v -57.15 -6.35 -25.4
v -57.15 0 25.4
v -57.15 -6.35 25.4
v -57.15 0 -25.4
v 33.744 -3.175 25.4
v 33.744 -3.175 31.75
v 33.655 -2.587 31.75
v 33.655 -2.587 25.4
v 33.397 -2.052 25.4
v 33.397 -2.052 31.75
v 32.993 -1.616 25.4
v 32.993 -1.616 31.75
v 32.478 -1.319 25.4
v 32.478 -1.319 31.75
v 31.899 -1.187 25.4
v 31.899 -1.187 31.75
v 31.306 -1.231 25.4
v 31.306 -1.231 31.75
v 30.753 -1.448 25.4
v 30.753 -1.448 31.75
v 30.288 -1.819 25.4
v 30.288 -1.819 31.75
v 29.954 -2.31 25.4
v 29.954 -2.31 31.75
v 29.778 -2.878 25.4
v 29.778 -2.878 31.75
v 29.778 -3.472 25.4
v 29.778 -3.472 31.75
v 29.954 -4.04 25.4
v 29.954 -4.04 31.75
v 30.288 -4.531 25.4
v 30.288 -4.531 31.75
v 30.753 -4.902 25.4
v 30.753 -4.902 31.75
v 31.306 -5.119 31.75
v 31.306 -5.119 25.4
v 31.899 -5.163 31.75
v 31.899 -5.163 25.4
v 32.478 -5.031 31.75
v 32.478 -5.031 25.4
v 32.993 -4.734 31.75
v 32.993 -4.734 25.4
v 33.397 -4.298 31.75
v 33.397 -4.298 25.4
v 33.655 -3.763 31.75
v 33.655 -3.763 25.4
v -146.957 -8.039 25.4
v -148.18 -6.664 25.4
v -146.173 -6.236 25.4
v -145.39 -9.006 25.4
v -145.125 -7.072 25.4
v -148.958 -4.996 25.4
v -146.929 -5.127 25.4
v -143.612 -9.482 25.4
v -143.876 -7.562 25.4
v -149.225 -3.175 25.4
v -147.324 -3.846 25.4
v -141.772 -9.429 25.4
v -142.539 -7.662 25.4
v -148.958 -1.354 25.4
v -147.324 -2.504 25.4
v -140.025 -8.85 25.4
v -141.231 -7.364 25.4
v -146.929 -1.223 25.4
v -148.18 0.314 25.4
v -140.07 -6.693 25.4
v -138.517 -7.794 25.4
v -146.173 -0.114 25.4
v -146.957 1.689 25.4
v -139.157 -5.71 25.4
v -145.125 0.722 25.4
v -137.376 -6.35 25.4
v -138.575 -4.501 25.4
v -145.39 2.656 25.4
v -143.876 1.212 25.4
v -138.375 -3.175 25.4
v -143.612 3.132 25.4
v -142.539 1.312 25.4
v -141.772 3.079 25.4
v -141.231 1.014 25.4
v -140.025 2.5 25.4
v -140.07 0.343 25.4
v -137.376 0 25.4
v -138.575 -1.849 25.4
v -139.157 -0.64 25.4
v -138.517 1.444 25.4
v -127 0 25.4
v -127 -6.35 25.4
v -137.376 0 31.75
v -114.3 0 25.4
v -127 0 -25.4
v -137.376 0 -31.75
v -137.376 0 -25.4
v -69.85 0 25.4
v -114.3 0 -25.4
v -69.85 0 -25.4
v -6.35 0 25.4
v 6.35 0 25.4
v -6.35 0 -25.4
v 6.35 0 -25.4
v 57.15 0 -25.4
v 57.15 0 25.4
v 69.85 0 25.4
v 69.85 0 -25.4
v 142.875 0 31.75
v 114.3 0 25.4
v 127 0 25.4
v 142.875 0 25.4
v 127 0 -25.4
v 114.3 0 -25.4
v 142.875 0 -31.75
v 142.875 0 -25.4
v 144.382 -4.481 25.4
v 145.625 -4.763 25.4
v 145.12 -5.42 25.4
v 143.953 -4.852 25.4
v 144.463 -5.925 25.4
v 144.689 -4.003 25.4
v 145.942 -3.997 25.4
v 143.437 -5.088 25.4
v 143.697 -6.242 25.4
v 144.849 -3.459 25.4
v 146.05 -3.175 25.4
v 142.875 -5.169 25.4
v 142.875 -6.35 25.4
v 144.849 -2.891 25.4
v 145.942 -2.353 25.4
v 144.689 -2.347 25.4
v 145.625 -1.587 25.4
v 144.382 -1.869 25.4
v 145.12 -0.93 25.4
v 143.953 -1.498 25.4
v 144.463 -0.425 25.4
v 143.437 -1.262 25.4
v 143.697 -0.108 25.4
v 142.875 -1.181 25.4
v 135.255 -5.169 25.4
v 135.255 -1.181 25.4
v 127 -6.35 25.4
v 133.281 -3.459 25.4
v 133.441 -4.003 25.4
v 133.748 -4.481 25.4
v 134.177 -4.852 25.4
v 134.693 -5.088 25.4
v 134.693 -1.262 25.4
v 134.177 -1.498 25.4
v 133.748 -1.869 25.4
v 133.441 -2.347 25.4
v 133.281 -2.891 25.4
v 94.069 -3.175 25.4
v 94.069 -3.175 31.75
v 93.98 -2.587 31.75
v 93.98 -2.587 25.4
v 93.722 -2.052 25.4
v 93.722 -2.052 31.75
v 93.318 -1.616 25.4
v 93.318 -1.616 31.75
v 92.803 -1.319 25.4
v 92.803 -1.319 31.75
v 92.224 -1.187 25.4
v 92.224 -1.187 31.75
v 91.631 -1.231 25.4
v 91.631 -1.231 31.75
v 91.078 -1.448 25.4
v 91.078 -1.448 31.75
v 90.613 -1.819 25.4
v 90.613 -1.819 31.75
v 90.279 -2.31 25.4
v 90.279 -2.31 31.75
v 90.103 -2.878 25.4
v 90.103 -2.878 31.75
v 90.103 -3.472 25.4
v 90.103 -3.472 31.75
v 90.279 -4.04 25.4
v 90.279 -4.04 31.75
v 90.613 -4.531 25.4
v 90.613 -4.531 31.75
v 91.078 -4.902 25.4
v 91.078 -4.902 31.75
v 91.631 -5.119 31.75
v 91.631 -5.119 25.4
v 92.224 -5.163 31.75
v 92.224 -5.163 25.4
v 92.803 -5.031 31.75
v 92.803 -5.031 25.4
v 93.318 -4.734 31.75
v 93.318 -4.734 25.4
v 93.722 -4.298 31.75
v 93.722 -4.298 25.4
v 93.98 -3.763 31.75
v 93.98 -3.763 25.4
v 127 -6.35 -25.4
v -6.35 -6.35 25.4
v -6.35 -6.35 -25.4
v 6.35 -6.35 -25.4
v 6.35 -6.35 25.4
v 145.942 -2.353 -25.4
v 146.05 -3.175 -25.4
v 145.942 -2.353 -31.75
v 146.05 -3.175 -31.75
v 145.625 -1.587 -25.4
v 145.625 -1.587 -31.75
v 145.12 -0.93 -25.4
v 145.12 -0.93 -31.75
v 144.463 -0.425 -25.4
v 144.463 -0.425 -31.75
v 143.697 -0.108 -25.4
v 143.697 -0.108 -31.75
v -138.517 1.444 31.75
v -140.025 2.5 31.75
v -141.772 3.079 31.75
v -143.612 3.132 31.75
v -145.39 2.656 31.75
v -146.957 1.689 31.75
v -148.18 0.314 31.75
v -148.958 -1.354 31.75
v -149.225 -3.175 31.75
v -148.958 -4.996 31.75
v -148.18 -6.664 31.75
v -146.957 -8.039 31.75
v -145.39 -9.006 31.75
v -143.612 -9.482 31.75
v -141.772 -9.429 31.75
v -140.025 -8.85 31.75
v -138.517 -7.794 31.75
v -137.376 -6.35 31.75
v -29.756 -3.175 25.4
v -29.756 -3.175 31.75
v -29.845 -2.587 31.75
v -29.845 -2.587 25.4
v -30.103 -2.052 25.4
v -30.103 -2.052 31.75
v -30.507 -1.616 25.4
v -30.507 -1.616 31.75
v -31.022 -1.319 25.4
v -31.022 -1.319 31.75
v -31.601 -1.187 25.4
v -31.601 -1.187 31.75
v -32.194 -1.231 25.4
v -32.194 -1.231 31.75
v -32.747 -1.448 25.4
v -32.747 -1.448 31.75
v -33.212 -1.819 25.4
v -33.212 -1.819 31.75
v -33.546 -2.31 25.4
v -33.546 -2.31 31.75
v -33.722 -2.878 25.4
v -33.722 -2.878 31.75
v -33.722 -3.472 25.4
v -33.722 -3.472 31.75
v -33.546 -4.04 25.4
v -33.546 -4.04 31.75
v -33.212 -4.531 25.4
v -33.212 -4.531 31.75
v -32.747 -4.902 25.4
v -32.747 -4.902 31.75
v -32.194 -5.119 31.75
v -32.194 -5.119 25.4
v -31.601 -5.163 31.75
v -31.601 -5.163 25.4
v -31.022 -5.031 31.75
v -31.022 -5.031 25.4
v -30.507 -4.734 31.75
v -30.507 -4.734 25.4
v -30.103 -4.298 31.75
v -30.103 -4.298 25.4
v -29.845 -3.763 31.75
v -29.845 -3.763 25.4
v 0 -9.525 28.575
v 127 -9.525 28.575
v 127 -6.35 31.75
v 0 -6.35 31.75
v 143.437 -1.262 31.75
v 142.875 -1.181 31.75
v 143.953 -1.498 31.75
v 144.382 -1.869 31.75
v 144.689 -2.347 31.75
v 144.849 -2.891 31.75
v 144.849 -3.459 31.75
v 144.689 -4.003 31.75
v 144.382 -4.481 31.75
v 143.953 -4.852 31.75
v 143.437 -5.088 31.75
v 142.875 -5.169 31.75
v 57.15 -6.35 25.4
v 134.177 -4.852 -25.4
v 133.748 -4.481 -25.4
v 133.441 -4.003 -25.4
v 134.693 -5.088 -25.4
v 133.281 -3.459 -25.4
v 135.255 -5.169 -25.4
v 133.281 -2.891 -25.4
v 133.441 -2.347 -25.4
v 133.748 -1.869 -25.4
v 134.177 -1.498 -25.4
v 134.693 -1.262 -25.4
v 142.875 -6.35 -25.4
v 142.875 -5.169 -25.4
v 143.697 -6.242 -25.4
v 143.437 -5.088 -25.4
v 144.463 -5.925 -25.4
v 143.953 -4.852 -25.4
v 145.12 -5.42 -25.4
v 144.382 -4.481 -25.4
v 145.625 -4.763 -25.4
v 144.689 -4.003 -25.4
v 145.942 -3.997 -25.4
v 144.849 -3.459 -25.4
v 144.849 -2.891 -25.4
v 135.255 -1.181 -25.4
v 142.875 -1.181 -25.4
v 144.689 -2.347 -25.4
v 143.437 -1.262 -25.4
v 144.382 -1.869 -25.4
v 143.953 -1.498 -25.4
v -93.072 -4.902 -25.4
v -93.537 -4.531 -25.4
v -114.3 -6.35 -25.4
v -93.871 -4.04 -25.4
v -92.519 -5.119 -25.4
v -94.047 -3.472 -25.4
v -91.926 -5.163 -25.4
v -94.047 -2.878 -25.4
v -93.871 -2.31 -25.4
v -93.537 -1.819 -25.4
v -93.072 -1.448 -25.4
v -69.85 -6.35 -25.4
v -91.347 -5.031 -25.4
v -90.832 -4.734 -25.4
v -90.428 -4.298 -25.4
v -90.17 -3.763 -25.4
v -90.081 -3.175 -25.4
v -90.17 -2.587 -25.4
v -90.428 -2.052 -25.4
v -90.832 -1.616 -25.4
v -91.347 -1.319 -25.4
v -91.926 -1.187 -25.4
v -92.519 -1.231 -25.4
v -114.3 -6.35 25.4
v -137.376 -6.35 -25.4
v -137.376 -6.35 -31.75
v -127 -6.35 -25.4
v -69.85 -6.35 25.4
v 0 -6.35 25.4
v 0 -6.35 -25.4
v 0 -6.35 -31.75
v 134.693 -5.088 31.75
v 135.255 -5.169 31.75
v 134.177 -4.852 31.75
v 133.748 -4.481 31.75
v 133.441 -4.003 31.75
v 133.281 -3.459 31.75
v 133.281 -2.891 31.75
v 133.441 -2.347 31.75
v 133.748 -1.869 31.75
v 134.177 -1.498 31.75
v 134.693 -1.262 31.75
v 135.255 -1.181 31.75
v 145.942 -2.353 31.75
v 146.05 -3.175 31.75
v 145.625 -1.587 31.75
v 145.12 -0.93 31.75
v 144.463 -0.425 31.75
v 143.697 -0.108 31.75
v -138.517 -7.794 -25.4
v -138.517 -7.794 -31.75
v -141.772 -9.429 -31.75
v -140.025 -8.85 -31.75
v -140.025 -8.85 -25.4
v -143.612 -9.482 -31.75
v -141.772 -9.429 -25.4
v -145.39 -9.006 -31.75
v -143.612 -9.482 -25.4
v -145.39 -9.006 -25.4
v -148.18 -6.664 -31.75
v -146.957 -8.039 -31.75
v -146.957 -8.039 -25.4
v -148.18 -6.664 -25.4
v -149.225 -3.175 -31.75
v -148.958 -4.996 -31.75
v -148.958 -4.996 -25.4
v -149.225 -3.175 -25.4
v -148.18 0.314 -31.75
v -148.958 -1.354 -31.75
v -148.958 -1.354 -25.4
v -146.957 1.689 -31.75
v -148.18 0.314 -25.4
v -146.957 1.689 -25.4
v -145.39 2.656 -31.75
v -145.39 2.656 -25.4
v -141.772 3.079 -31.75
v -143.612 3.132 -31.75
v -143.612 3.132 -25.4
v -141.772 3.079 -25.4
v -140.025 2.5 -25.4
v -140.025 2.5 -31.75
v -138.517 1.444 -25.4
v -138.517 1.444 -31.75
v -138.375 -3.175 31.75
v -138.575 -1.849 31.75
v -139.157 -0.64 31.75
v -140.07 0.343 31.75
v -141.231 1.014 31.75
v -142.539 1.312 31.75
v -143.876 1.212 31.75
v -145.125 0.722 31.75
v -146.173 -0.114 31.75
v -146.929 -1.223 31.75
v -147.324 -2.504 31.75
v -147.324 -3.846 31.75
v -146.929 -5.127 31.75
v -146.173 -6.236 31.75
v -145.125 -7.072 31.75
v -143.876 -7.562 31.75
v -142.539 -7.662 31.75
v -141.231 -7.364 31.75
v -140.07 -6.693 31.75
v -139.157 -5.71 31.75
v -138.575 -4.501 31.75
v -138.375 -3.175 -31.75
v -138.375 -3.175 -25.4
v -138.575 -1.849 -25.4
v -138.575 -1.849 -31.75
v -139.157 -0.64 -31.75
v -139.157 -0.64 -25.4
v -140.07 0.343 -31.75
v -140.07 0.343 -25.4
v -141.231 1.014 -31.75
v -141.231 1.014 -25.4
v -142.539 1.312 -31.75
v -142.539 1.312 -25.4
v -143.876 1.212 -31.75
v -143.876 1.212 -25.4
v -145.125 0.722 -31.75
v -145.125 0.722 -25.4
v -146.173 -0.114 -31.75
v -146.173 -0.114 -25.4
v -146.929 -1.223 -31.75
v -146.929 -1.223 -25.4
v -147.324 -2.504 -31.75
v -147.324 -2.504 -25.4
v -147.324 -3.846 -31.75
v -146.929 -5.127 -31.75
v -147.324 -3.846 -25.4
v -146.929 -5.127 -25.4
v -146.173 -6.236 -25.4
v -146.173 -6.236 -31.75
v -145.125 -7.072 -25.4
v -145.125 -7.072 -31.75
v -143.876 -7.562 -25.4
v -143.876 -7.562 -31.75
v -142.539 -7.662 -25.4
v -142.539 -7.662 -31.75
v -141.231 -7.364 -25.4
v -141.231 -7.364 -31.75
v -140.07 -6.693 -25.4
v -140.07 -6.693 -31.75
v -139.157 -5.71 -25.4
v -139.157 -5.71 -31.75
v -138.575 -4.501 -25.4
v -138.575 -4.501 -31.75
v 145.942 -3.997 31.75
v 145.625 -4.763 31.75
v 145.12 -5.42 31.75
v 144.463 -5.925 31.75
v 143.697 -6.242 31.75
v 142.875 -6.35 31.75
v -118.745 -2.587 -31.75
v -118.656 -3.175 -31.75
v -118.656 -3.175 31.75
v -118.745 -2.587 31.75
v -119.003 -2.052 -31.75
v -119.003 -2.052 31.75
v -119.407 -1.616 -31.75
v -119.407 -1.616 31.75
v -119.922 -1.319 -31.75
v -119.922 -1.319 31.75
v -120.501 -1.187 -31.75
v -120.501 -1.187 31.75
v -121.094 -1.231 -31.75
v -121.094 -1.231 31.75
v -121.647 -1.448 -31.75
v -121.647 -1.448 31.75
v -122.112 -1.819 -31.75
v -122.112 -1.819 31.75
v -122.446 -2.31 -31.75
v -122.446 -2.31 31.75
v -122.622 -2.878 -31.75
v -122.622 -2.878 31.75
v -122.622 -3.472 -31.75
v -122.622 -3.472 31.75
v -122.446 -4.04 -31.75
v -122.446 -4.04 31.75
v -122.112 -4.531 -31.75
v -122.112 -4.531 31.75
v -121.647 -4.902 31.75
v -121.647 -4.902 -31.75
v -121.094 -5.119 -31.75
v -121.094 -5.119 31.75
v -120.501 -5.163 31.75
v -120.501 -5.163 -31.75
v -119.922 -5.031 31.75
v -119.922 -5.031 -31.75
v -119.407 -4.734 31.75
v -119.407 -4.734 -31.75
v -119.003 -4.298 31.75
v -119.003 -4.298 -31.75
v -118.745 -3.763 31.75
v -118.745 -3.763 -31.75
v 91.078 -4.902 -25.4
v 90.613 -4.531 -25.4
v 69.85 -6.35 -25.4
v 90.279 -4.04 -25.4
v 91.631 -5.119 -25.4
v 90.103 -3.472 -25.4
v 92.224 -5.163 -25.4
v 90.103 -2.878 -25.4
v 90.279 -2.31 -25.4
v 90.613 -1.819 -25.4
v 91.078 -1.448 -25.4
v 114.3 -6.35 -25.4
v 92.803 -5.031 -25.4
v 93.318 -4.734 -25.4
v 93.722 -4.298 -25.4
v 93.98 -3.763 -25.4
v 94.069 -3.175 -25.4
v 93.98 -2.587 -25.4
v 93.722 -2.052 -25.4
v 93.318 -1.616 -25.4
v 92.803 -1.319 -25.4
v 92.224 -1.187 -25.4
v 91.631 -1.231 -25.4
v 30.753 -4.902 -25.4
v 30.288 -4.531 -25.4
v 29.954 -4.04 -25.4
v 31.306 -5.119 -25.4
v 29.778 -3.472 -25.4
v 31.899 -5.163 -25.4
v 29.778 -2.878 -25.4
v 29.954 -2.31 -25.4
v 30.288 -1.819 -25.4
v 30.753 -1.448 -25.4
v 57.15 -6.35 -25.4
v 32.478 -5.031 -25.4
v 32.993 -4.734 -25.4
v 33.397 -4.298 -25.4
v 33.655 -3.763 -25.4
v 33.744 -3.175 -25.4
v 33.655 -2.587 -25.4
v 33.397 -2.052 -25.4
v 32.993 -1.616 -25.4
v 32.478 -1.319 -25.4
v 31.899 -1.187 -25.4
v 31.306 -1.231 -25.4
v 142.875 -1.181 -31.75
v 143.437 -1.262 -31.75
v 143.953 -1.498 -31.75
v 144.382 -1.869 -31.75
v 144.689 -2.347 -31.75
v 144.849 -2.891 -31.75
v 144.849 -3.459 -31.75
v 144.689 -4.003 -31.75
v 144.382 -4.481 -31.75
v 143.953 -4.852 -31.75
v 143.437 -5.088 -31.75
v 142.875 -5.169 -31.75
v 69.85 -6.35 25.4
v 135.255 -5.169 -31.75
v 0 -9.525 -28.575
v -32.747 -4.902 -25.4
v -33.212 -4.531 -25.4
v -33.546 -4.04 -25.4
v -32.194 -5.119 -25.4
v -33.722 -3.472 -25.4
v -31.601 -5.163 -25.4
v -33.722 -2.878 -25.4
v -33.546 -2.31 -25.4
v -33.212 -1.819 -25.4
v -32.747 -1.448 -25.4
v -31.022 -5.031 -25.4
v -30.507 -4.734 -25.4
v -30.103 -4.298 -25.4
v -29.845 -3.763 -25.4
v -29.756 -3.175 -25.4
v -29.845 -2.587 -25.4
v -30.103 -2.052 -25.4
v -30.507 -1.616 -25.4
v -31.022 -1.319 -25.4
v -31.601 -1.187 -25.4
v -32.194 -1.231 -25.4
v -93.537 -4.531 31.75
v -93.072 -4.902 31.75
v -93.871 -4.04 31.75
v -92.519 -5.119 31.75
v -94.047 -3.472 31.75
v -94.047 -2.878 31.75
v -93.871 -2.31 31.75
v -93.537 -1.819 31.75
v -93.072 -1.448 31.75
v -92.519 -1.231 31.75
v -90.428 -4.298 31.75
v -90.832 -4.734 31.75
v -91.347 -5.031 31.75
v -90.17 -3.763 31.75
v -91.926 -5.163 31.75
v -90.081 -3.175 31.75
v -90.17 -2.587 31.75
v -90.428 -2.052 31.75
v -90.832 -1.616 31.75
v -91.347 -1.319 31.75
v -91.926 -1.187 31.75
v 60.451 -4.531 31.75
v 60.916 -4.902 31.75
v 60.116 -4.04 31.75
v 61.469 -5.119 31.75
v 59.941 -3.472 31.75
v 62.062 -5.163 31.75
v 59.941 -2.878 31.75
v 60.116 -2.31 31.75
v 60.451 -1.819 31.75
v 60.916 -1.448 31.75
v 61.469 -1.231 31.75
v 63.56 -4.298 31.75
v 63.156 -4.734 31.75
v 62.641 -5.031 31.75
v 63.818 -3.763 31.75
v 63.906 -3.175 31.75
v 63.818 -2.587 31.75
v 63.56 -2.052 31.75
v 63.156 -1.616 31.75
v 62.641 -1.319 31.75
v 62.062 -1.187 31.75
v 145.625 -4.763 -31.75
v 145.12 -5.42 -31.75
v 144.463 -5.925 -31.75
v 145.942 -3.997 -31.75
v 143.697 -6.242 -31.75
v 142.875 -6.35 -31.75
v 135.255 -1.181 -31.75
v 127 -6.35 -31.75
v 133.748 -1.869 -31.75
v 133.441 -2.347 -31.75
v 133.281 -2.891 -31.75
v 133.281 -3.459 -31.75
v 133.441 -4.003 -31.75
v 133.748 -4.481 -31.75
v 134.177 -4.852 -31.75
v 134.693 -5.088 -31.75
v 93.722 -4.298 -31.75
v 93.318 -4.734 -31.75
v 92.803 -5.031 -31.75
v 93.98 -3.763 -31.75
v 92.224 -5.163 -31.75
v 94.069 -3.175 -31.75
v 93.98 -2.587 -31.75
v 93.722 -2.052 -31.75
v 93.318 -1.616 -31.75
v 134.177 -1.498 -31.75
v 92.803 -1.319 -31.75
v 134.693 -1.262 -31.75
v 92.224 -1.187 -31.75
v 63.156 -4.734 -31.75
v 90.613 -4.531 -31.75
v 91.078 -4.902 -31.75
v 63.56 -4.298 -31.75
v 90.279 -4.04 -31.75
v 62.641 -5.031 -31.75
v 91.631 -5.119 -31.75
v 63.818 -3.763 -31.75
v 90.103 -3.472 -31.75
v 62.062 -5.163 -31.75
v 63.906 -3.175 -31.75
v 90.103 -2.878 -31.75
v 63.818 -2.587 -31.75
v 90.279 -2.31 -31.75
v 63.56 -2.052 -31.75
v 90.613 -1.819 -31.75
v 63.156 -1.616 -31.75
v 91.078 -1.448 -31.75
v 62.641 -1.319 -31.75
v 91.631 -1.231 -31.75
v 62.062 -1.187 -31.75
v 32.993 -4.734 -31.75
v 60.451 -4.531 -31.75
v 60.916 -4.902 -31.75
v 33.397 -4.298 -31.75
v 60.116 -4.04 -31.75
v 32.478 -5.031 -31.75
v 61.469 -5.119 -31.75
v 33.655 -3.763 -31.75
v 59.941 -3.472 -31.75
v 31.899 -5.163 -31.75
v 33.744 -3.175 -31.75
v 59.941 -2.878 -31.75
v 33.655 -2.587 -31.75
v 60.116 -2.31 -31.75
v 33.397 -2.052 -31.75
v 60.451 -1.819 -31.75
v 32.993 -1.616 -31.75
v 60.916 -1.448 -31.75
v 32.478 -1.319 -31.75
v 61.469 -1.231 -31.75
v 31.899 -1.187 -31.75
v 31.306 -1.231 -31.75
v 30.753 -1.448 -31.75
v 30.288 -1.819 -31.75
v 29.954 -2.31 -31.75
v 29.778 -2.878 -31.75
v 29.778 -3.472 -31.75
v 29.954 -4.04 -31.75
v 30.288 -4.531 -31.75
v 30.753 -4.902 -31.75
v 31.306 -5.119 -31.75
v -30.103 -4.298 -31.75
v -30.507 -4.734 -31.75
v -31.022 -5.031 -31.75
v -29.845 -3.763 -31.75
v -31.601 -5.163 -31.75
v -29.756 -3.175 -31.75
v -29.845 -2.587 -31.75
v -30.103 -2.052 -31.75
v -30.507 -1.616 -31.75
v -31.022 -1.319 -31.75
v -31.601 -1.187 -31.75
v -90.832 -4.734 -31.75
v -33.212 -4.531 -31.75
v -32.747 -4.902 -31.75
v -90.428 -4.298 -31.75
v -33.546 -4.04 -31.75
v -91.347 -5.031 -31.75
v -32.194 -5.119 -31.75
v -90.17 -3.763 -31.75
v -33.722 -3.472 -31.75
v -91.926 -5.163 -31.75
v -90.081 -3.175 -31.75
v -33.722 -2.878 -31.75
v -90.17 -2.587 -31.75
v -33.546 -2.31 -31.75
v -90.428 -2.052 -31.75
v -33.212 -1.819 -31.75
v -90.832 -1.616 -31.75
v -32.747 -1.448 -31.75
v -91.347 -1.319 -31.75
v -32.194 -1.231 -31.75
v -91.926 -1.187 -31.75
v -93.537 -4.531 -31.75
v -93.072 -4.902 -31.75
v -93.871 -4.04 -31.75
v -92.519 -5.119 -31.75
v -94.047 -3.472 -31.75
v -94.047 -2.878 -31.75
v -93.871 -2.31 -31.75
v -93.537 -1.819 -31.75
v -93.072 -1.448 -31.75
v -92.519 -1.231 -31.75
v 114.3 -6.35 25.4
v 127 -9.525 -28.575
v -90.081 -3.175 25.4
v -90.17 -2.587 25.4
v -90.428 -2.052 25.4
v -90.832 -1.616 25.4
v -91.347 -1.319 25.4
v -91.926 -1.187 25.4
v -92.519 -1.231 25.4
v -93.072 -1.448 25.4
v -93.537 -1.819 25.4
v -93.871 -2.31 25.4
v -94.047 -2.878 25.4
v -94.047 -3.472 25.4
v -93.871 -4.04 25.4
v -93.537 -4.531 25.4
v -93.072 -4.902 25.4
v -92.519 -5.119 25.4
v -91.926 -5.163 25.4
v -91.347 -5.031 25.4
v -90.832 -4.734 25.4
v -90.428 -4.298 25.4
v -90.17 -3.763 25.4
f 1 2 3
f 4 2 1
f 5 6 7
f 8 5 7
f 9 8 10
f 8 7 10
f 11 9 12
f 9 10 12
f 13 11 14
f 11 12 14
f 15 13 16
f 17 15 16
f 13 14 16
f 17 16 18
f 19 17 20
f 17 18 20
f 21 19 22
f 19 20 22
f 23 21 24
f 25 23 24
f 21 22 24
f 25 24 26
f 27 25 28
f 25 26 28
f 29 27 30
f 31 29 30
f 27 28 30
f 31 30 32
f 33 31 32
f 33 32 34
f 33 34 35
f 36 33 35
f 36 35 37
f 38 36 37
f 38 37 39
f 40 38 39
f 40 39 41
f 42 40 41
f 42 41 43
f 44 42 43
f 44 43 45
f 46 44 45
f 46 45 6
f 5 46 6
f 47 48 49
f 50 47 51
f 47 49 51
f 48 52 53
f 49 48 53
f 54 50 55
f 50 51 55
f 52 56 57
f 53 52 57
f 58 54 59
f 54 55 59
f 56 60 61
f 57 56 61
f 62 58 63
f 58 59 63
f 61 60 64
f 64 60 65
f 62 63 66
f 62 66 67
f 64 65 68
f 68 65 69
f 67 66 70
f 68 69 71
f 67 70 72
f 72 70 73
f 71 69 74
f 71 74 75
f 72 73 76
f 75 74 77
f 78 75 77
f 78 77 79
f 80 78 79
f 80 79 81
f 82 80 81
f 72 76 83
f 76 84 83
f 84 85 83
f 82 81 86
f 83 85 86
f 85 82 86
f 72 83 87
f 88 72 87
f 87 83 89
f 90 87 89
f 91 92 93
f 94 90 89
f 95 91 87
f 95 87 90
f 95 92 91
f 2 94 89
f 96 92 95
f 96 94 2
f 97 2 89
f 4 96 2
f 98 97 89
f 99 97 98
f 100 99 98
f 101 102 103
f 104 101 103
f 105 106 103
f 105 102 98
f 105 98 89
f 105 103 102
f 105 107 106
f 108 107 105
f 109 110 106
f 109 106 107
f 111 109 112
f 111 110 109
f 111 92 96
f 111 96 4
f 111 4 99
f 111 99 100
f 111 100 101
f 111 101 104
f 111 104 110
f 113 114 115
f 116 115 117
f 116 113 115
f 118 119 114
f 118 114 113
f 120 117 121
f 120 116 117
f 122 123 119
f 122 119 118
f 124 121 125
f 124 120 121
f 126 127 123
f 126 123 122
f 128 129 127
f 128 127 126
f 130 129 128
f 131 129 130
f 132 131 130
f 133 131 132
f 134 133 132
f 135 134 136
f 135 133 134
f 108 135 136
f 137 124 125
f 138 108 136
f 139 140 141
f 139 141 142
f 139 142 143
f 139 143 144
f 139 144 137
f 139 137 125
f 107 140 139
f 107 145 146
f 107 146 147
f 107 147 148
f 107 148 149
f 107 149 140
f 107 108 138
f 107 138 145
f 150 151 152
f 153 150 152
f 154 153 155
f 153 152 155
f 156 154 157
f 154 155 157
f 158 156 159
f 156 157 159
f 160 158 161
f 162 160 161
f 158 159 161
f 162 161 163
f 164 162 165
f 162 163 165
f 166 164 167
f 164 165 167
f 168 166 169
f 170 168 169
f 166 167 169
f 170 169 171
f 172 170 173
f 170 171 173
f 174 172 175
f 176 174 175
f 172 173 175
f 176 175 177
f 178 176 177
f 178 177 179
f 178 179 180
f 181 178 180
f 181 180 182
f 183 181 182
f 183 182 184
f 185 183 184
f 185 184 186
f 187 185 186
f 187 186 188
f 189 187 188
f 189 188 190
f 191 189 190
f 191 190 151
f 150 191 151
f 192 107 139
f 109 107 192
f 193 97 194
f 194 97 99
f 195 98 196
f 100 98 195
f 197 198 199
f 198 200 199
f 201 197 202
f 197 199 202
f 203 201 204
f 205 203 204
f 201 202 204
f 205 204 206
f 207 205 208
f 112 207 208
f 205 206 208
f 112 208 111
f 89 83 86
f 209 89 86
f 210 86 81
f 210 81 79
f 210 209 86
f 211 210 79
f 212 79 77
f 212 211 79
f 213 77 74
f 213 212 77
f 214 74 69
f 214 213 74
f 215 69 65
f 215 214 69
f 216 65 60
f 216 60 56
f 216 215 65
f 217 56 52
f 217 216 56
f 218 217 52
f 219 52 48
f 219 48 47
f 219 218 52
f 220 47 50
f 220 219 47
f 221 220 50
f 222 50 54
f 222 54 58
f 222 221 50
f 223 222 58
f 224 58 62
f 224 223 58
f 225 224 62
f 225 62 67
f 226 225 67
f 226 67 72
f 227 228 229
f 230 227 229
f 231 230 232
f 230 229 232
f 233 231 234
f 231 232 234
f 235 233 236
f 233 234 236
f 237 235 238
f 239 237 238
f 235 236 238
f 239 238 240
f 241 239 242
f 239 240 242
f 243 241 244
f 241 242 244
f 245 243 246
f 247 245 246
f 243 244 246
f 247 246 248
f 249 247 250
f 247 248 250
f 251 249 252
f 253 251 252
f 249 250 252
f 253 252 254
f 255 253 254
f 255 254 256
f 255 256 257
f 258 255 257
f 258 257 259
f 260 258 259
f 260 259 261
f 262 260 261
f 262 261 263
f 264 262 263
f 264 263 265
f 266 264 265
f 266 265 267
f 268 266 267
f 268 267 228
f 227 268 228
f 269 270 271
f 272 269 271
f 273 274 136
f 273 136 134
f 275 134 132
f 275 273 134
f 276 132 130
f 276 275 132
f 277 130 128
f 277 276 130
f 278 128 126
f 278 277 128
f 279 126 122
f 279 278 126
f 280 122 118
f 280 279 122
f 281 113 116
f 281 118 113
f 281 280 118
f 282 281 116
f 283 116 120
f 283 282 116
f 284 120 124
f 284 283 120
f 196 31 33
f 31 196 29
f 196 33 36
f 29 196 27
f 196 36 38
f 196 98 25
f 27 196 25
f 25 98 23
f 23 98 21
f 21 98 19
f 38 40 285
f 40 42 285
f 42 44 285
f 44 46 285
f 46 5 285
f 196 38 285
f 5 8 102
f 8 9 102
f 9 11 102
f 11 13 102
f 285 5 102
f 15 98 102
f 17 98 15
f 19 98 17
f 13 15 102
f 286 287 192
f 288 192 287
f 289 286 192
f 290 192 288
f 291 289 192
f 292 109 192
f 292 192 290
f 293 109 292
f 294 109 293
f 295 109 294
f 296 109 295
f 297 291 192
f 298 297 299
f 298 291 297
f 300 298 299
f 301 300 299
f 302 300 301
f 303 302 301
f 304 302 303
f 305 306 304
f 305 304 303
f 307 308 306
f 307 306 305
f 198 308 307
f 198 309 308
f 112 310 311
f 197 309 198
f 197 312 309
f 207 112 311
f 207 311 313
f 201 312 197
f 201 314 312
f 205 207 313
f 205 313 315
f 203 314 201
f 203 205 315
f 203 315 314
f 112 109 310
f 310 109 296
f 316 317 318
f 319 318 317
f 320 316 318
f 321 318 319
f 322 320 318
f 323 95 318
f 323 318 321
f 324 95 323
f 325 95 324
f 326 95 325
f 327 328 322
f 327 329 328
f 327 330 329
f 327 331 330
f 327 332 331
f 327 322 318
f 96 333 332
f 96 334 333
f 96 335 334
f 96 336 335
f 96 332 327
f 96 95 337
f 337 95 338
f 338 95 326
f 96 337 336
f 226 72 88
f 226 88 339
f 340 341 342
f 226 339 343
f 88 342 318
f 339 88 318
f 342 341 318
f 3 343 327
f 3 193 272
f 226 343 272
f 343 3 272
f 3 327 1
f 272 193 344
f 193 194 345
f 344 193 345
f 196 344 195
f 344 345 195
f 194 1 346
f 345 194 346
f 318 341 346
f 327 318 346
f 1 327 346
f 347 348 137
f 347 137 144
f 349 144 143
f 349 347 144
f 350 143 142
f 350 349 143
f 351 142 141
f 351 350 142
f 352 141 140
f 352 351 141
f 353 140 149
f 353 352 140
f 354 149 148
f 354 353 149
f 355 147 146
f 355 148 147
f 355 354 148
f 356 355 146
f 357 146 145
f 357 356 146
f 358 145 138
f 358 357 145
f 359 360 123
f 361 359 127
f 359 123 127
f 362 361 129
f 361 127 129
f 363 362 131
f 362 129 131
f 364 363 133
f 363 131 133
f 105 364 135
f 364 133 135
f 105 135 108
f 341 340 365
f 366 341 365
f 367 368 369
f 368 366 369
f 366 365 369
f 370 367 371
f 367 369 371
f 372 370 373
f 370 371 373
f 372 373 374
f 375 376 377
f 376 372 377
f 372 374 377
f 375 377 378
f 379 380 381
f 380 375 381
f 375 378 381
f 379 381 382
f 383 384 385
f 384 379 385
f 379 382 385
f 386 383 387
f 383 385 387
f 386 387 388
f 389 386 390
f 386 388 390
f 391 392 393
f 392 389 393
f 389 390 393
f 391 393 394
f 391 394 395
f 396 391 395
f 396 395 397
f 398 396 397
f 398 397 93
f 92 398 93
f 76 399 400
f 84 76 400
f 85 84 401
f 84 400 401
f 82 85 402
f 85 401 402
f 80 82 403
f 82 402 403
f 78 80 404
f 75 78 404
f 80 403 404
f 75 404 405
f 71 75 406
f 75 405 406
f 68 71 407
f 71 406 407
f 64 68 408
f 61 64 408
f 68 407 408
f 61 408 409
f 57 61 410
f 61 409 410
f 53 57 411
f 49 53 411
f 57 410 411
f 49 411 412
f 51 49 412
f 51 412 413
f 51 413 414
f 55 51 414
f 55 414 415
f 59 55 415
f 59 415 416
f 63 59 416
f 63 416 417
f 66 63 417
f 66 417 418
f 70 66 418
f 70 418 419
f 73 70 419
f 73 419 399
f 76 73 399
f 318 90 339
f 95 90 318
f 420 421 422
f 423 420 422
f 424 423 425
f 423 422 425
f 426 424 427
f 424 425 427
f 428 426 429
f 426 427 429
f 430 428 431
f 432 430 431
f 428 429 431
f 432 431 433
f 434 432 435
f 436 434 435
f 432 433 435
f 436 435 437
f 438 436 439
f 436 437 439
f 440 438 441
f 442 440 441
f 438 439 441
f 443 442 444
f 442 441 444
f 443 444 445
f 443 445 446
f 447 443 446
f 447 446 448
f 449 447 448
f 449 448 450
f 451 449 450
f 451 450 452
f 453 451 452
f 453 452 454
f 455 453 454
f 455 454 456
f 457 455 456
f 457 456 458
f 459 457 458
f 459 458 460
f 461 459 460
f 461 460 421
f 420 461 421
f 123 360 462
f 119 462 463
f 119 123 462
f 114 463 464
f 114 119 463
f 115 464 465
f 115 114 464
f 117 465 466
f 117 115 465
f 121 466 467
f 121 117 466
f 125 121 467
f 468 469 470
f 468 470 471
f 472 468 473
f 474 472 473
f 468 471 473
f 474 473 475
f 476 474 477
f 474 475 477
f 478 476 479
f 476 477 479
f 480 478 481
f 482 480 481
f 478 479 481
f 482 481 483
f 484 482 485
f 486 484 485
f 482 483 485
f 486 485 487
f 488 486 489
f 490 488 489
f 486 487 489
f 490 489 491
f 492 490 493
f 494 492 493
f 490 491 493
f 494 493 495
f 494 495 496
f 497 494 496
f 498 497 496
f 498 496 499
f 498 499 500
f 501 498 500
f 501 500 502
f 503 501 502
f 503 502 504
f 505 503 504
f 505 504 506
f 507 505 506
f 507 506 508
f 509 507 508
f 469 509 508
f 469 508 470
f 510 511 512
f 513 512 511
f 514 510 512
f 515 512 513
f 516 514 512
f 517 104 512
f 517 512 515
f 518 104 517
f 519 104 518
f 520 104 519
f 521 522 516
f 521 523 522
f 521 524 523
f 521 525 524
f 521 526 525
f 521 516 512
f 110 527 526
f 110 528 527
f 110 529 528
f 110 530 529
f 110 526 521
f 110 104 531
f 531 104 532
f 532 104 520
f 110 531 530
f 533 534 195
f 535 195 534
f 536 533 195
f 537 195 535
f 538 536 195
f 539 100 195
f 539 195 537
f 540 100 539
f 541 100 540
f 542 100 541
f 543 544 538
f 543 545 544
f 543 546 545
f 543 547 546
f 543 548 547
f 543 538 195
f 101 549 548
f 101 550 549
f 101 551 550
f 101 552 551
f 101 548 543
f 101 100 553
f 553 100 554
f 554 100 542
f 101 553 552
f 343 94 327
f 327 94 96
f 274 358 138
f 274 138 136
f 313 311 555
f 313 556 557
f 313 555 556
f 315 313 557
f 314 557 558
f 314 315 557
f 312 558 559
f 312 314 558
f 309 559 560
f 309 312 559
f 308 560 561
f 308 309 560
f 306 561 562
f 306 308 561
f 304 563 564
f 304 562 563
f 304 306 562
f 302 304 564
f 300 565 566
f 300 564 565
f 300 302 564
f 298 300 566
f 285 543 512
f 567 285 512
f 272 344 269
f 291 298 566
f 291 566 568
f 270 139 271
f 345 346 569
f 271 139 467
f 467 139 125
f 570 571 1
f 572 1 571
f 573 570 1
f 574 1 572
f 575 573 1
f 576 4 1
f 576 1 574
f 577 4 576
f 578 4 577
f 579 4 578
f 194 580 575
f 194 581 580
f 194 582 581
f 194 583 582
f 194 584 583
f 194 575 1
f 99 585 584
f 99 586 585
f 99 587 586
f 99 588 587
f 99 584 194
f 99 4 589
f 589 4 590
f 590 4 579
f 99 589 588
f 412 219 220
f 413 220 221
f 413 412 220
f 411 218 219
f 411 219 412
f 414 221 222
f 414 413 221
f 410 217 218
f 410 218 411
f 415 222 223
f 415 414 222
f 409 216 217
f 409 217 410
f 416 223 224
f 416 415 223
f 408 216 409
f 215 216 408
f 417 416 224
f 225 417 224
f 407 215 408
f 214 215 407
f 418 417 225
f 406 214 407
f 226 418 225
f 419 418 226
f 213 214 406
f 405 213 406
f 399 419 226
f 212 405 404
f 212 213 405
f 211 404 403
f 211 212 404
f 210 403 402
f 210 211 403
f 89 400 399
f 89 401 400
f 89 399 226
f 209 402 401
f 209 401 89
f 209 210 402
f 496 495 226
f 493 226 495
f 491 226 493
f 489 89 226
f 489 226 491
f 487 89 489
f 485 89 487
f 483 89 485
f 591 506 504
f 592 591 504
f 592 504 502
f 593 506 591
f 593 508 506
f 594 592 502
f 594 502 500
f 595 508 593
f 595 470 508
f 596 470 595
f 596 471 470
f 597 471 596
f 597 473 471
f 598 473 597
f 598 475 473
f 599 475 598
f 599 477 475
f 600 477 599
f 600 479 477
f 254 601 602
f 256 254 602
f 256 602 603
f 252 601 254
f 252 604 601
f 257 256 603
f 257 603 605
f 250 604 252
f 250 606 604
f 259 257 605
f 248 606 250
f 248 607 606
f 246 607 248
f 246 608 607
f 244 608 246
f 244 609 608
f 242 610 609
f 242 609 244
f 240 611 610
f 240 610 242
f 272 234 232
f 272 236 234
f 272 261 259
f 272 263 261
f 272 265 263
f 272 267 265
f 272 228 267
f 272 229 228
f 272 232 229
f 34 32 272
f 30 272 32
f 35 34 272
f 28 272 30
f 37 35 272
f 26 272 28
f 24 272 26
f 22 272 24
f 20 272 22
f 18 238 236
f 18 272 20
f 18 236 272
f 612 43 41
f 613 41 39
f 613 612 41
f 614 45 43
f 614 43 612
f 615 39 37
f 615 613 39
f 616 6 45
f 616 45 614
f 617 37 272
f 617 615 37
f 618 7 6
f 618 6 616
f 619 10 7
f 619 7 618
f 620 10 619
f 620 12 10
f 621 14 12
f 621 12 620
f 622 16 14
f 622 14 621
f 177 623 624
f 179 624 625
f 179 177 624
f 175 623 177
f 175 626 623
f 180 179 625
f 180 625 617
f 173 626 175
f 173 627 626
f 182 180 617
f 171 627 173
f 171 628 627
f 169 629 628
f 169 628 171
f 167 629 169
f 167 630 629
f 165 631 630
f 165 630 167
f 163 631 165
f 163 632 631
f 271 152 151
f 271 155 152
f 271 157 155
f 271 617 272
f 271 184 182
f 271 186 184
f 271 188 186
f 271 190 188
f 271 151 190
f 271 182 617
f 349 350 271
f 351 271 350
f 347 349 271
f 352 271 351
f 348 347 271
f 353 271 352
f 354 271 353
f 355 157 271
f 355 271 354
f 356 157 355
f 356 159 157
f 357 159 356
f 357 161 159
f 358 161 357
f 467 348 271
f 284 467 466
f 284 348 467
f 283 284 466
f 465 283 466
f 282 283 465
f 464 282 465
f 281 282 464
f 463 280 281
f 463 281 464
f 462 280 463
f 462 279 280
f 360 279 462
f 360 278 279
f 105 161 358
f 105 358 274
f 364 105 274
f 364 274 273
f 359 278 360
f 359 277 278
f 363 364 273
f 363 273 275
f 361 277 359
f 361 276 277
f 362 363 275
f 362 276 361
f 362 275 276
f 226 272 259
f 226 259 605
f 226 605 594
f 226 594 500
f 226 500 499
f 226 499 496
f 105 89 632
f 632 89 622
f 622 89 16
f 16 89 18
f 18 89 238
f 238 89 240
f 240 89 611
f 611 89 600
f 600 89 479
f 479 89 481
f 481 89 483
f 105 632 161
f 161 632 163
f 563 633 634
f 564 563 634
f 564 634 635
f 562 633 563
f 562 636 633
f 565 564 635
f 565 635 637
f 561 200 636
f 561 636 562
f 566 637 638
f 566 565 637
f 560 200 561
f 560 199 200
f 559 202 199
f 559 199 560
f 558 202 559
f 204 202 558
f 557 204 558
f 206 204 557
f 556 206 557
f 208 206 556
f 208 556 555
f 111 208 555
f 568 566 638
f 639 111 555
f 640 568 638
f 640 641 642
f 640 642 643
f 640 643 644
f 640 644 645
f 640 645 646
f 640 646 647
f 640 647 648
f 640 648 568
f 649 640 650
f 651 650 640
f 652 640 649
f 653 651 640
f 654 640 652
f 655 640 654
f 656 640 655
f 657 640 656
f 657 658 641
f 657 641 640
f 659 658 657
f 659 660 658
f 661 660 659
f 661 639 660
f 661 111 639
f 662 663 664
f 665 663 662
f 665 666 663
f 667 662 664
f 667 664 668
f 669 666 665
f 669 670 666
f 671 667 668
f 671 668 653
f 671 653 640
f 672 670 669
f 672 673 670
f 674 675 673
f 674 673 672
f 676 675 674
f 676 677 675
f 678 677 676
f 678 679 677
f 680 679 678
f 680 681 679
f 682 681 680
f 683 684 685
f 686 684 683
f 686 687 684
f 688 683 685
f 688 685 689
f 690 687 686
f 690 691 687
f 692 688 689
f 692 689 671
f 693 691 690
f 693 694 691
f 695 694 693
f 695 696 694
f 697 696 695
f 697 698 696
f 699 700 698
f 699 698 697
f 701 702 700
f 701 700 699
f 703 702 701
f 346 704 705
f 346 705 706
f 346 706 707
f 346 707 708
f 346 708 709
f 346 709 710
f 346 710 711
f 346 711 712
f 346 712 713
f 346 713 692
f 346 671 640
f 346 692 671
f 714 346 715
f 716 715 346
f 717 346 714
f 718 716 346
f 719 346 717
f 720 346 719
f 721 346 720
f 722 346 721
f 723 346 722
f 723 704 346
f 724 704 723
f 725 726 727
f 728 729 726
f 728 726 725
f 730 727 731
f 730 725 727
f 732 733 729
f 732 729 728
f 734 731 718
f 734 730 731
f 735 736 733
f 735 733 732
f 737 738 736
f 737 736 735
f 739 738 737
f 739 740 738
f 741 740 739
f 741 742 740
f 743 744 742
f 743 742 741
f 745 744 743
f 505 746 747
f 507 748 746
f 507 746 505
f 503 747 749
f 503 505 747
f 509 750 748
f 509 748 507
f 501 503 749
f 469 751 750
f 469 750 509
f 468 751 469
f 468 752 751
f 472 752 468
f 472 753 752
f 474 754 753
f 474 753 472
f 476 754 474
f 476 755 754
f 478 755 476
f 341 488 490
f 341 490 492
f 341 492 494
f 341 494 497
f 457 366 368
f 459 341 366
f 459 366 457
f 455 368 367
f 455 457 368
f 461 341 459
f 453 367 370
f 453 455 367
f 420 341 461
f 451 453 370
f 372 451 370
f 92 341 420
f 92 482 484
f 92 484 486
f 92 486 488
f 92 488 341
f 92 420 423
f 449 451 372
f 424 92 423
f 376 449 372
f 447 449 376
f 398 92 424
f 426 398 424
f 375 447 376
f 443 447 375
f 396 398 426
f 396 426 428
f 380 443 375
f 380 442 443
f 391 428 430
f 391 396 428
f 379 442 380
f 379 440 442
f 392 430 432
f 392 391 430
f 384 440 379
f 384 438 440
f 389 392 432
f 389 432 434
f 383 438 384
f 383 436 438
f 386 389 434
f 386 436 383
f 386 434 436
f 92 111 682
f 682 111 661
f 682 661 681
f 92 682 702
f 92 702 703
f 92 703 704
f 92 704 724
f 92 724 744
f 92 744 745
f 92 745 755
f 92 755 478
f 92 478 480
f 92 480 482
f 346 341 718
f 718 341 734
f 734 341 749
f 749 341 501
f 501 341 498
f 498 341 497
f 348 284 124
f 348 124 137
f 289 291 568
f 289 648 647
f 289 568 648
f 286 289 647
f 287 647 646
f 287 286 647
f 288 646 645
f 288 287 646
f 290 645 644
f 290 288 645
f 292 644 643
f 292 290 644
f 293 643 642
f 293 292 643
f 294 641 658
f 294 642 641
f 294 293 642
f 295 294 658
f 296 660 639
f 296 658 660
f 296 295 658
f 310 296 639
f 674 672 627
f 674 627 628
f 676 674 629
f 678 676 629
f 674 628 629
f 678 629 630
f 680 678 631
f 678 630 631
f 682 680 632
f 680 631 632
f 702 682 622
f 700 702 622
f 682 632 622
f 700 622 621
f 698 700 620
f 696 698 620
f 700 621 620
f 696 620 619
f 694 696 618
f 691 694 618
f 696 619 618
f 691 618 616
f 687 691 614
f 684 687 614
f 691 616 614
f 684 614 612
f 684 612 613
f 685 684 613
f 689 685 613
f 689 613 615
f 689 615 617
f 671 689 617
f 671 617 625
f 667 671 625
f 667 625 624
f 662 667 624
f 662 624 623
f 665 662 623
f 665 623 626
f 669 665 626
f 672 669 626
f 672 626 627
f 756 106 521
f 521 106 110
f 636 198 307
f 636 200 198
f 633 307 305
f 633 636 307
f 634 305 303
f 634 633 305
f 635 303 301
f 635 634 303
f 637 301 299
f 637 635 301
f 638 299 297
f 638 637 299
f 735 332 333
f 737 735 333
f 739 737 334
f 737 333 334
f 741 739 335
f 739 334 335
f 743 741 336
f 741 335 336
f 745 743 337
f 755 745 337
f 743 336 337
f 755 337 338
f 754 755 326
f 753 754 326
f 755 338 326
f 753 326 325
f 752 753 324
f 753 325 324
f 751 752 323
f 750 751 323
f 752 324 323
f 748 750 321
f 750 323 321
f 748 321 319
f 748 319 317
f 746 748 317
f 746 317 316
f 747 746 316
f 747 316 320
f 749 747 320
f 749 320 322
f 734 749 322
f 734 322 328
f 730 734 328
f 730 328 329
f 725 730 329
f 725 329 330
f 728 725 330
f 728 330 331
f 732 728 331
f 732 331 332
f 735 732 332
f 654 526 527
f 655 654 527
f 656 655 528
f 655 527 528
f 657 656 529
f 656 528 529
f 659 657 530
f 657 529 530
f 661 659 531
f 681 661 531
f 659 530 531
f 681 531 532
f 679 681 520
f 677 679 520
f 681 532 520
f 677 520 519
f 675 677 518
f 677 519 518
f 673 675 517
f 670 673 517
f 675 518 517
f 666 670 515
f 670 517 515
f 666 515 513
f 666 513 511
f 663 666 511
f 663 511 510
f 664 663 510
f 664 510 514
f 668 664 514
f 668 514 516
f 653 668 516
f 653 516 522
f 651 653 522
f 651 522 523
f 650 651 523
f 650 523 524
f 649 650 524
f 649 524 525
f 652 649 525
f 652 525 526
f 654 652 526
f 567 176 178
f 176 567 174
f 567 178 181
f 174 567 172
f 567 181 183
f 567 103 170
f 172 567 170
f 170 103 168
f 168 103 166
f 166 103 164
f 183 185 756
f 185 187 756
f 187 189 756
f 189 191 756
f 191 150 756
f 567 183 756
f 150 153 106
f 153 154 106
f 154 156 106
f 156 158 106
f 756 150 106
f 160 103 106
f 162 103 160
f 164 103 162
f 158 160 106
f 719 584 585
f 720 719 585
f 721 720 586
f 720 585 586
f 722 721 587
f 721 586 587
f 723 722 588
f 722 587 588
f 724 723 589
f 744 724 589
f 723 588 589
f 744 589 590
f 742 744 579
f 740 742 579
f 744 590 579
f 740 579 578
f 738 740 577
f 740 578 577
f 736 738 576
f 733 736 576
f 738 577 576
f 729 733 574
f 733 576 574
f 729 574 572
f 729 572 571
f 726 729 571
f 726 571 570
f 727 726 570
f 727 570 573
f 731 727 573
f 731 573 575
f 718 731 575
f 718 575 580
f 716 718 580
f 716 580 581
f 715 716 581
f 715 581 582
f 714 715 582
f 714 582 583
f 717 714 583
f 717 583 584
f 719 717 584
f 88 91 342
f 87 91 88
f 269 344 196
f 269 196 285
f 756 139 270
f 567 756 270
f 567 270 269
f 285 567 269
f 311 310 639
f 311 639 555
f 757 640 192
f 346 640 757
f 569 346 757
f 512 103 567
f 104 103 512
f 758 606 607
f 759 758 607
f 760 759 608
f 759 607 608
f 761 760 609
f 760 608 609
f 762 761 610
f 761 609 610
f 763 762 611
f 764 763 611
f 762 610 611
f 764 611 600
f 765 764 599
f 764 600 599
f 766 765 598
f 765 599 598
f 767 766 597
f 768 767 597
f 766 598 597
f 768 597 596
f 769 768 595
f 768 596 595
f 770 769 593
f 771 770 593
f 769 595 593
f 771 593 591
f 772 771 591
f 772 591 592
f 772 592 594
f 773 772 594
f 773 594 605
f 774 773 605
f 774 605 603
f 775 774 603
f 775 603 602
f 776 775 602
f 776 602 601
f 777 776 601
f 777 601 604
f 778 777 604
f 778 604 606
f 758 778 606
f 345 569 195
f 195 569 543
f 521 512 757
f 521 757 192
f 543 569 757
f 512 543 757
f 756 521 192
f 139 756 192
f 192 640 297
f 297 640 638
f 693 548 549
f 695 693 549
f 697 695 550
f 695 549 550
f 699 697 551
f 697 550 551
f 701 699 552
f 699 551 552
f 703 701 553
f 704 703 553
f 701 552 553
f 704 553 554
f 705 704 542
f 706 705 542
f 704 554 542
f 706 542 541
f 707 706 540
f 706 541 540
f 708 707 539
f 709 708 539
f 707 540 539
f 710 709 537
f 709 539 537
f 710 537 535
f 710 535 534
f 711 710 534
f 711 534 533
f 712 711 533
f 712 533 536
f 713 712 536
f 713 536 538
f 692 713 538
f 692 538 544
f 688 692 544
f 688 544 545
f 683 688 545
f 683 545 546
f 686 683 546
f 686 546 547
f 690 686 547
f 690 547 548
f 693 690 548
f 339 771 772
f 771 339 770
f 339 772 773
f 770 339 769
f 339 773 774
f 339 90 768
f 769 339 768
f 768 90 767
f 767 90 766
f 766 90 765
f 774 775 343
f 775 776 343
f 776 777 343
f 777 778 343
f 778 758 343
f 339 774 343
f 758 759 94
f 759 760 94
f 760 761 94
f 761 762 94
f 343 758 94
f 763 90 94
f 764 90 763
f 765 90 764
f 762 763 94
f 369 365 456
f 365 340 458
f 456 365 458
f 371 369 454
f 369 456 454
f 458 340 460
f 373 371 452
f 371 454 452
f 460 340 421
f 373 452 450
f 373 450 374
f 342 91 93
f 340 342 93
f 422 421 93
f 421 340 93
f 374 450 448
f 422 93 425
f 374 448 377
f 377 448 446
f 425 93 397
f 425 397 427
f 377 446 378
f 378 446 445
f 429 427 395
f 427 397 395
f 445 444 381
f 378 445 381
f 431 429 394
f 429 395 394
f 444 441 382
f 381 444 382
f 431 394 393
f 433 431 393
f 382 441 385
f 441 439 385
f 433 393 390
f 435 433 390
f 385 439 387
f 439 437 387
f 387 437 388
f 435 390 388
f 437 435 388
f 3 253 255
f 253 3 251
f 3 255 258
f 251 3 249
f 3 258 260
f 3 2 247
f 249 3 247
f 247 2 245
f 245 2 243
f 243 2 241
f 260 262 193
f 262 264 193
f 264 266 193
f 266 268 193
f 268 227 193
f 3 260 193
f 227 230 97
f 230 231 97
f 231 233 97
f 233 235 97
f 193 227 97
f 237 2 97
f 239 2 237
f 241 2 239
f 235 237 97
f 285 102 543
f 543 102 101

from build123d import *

# Parameters (mm, degrees)
SKETCH1_W           = 50.8
SKETCH1_H           = 50.8
SKETCH1_W_2         = 44.45
BOSS_EXTRUDE1_DEPTH = 6.35
FILLET2_R           = 3.175
SKETCH2_R           = 6.35
BOSS_EXTRUDE3_DEPTH = 6.35
BOSS_EXTRUDE4_START = -6.35
SKETCH4_R           = 6.35
BOSS_EXTRUDE4_DEPTH = 6.35
CUT_EXTRUDE1_REACH  = 164.453
SKETCH2_4_R         = 4.49961
SKETCH2_4_R_2       = 1.9939
BOSS_EXTRUDE5_DEPTH = 127


with BuildPart() as part:
    # Sketch1 → Boss-Extrude1 (new body)
    with BuildSketch(Plane(origin=(0, 0, 0), x_dir=(1, 0, 0), z_dir=(0, 1, 0))):
        Polygon((-146.05, 25.4), (-127, 25.4), (-127, -25.4), (-146.05, -25.4), (-146.05, -31.75), (146.05, -31.75), (146.05, -25.4), (127, -25.4), (127, 25.4), (146.05, 25.4), (146.05, 31.75), (-146.05, 31.75), align=None)
        with Locations((-31.75, 0)):
            Rectangle(SKETCH1_W, SKETCH1_H, mode=Mode.SUBTRACT)
        with Locations((-92.075, 0)):
            Rectangle(SKETCH1_W_2, SKETCH1_H, mode=Mode.SUBTRACT)
        with Locations((31.75, 0)):
            Rectangle(SKETCH1_W, SKETCH1_H, mode=Mode.SUBTRACT)
        with Locations((92.075, 0)):
            Rectangle(SKETCH1_W_2, SKETCH1_H, mode=Mode.SUBTRACT)
    extrude(amount=-BOSS_EXTRUDE1_DEPTH)

    # Fillet2
    fillet2_edges = [part.edges().sort_by_distance(p)[0] for p in [
        (-146.05, -6.35, 28.575),
        (-146.05, 0, 28.575),
        (-146.05, -6.35, -28.575),
        (-146.05, 0, -28.575),
        (146.05, -6.35, -28.575),
        (146.05, 0, -28.575),
        (146.05, -6.35, 28.575),
        (146.05, 0, 28.575),
    ]]
    fillet(fillet2_edges, radius=FILLET2_R - 0.0001)  # a hair under: the kernel refuses the full size

    # Sketch2 → Boss-Extrude3 (add)
    with BuildSketch(Plane.XY.offset(31.75)):
        with Locations((-142.875, -3.175)):
            Circle(SKETCH2_R)
    extrude(amount=-BOSS_EXTRUDE3_DEPTH)

    # Sketch4 → Boss-Extrude4 (add)
    with BuildSketch(Plane(origin=(0, 0, -31.75), x_dir=(-1, 0, 0), z_dir=(0, 0, -1)).offset(BOSS_EXTRUDE4_START)):
        with Locations((142.875, -3.175)):
            Circle(SKETCH4_R)
    extrude(amount=BOSS_EXTRUDE4_DEPTH)

    # Cut-Extrude1: up to this face of the body (flat: up to its plane)
    cut_extrude1_end = Plane(part.part.faces().sort_by_distance((-5.43222234, -3.175, -31.75))[0])
    # Sketch2<4> → Cut-Extrude1 (cut, up to the picked face)
    with BuildSketch(Plane.XY.offset(31.75), mode=Mode.PRIVATE) as cut_extrude1_sk1:
        with Locations((-142.875, -3.175)):
            Circle(SKETCH2_4_R)
    cut_extrude1_tool1 = split(extrude(cut_extrude1_sk1.sketch, amount=-CUT_EXTRUDE1_REACH, mode=Mode.PRIVATE), bisect_by=cut_extrude1_end, keep=Keep.BOTH, mode=Mode.PRIVATE)
    # Sketch2<4> → Cut-Extrude1 (cut, up to the picked face)
    with BuildSketch(Plane.XY.offset(31.75), mode=Mode.PRIVATE) as cut_extrude1_sk2:
        with Locations((-92.075, -3.175)):
            Circle(SKETCH2_4_R_2)
    cut_extrude1_tool2 = split(extrude(cut_extrude1_sk2.sketch, amount=-CUT_EXTRUDE1_REACH, mode=Mode.PRIVATE), bisect_by=cut_extrude1_end, keep=Keep.BOTH, mode=Mode.PRIVATE)
    # Sketch2<4> → Cut-Extrude1 (cut, up to the picked face)
    with BuildSketch(Plane.XY.offset(31.75), mode=Mode.PRIVATE) as cut_extrude1_sk3:
        with Locations((-31.75, -3.175)):
            Circle(SKETCH2_4_R_2)
    cut_extrude1_tool3 = split(extrude(cut_extrude1_sk3.sketch, amount=-CUT_EXTRUDE1_REACH, mode=Mode.PRIVATE), bisect_by=cut_extrude1_end, keep=Keep.BOTH, mode=Mode.PRIVATE)
    # Sketch2<4> → Cut-Extrude1 (cut, up to the picked face)
    with BuildSketch(Plane.XY.offset(31.75), mode=Mode.PRIVATE) as cut_extrude1_sk4:
        with Locations((31.75, -3.175)):
            Circle(SKETCH2_4_R_2)
    cut_extrude1_tool4 = split(extrude(cut_extrude1_sk4.sketch, amount=-CUT_EXTRUDE1_REACH, mode=Mode.PRIVATE), bisect_by=cut_extrude1_end, keep=Keep.BOTH, mode=Mode.PRIVATE)
    # Sketch2<4> → Cut-Extrude1 (cut, up to the picked face)
    with BuildSketch(Plane.XY.offset(31.75), mode=Mode.PRIVATE) as cut_extrude1_sk5:
        with Locations((92.075, -3.175)):
            Circle(SKETCH2_4_R_2)
    cut_extrude1_tool5 = split(extrude(cut_extrude1_sk5.sketch, amount=-CUT_EXTRUDE1_REACH, mode=Mode.PRIVATE), bisect_by=cut_extrude1_end, keep=Keep.BOTH, mode=Mode.PRIVATE)
    # Sketch2<4> → Cut-Extrude1 (cut, up to the picked face)
    with BuildSketch(Plane.XY.offset(31.75), mode=Mode.PRIVATE) as cut_extrude1_sk6:
        with Locations((-120.65, -3.175)):
            Circle(SKETCH2_4_R_2)
    cut_extrude1_tool6 = split(extrude(cut_extrude1_sk6.sketch, amount=-CUT_EXTRUDE1_REACH, mode=Mode.PRIVATE), bisect_by=cut_extrude1_end, keep=Keep.BOTH, mode=Mode.PRIVATE)
    # Sketch2<4> → Cut-Extrude1 (cut, up to the picked face)
    with BuildSketch(Plane.XY.offset(31.75), mode=Mode.PRIVATE) as cut_extrude1_sk7:
        with Locations((61.9125, -3.175)):
            Circle(SKETCH2_4_R_2)
    cut_extrude1_tool7 = split(extrude(cut_extrude1_sk7.sketch, amount=-CUT_EXTRUDE1_REACH, mode=Mode.PRIVATE), bisect_by=cut_extrude1_end, keep=Keep.BOTH, mode=Mode.PRIVATE)
    # Sketch2<4> → Cut-Extrude1 (cut, up to the picked face)
    with BuildSketch(Plane.XY.offset(31.75), mode=Mode.PRIVATE) as cut_extrude1_sk8:
        with BuildLine():
            Line((135.255, -1.1811), (142.875, -1.1811))
            ThreePointArc((142.875, -1.1811), (144.8689, -3.175), (142.875, -5.1689))
            Line((142.875, -5.1689), (135.255, -5.1689))
            ThreePointArc((135.255, -5.1689), (133.2611, -3.175), (135.255, -1.1811))
        make_face()
    cut_extrude1_tool8 = split(extrude(cut_extrude1_sk8.sketch, amount=-CUT_EXTRUDE1_REACH, mode=Mode.PRIVATE), bisect_by=cut_extrude1_end, keep=Keep.BOTH, mode=Mode.PRIVATE)
    add(cut_extrude1_tool1.solids().sort_by(Axis((-142.875, -3.175, 31.75), (0, 0, -1)))[0], mode=Mode.SUBTRACT)
    add(cut_extrude1_tool2.solids().sort_by(Axis((-92.075, -3.175, 31.75), (0, 0, -1)))[0], mode=Mode.SUBTRACT)
    add(cut_extrude1_tool3.solids().sort_by(Axis((-31.75, -3.175, 31.75), (0, 0, -1)))[0], mode=Mode.SUBTRACT)
    add(cut_extrude1_tool4.solids().sort_by(Axis((31.75, -3.175, 31.75), (0, 0, -1)))[0], mode=Mode.SUBTRACT)
    add(cut_extrude1_tool5.solids().sort_by(Axis((92.075, -3.175, 31.75), (0, 0, -1)))[0], mode=Mode.SUBTRACT)
    add(cut_extrude1_tool6.solids().sort_by(Axis((-120.65, -3.175, 31.75), (0, 0, -1)))[0], mode=Mode.SUBTRACT)
    add(cut_extrude1_tool7.solids().sort_by(Axis((61.9125, -3.175, 31.75), (0, 0, -1)))[0], mode=Mode.SUBTRACT)
    add(cut_extrude1_tool8.solids().sort_by(Axis((139.065, -3.175, 31.75), (0, 0, -1)))[0], mode=Mode.SUBTRACT)

    # Sketch5 → Boss-Extrude5 (add)
    with BuildSketch(Plane(origin=(127, 0, 0), x_dir=(0, 0, -1), z_dir=(1, 0, 0))):
        Polygon((25.4, -6.35), (31.75, -6.35), (28.575, -9.525), align=None)
        Polygon((-31.75, -6.35), (-25.4, -6.35), (-28.575, -9.525), align=None)
    extrude(amount=-BOSS_EXTRUDE5_DEPTH)


solid = part.part
